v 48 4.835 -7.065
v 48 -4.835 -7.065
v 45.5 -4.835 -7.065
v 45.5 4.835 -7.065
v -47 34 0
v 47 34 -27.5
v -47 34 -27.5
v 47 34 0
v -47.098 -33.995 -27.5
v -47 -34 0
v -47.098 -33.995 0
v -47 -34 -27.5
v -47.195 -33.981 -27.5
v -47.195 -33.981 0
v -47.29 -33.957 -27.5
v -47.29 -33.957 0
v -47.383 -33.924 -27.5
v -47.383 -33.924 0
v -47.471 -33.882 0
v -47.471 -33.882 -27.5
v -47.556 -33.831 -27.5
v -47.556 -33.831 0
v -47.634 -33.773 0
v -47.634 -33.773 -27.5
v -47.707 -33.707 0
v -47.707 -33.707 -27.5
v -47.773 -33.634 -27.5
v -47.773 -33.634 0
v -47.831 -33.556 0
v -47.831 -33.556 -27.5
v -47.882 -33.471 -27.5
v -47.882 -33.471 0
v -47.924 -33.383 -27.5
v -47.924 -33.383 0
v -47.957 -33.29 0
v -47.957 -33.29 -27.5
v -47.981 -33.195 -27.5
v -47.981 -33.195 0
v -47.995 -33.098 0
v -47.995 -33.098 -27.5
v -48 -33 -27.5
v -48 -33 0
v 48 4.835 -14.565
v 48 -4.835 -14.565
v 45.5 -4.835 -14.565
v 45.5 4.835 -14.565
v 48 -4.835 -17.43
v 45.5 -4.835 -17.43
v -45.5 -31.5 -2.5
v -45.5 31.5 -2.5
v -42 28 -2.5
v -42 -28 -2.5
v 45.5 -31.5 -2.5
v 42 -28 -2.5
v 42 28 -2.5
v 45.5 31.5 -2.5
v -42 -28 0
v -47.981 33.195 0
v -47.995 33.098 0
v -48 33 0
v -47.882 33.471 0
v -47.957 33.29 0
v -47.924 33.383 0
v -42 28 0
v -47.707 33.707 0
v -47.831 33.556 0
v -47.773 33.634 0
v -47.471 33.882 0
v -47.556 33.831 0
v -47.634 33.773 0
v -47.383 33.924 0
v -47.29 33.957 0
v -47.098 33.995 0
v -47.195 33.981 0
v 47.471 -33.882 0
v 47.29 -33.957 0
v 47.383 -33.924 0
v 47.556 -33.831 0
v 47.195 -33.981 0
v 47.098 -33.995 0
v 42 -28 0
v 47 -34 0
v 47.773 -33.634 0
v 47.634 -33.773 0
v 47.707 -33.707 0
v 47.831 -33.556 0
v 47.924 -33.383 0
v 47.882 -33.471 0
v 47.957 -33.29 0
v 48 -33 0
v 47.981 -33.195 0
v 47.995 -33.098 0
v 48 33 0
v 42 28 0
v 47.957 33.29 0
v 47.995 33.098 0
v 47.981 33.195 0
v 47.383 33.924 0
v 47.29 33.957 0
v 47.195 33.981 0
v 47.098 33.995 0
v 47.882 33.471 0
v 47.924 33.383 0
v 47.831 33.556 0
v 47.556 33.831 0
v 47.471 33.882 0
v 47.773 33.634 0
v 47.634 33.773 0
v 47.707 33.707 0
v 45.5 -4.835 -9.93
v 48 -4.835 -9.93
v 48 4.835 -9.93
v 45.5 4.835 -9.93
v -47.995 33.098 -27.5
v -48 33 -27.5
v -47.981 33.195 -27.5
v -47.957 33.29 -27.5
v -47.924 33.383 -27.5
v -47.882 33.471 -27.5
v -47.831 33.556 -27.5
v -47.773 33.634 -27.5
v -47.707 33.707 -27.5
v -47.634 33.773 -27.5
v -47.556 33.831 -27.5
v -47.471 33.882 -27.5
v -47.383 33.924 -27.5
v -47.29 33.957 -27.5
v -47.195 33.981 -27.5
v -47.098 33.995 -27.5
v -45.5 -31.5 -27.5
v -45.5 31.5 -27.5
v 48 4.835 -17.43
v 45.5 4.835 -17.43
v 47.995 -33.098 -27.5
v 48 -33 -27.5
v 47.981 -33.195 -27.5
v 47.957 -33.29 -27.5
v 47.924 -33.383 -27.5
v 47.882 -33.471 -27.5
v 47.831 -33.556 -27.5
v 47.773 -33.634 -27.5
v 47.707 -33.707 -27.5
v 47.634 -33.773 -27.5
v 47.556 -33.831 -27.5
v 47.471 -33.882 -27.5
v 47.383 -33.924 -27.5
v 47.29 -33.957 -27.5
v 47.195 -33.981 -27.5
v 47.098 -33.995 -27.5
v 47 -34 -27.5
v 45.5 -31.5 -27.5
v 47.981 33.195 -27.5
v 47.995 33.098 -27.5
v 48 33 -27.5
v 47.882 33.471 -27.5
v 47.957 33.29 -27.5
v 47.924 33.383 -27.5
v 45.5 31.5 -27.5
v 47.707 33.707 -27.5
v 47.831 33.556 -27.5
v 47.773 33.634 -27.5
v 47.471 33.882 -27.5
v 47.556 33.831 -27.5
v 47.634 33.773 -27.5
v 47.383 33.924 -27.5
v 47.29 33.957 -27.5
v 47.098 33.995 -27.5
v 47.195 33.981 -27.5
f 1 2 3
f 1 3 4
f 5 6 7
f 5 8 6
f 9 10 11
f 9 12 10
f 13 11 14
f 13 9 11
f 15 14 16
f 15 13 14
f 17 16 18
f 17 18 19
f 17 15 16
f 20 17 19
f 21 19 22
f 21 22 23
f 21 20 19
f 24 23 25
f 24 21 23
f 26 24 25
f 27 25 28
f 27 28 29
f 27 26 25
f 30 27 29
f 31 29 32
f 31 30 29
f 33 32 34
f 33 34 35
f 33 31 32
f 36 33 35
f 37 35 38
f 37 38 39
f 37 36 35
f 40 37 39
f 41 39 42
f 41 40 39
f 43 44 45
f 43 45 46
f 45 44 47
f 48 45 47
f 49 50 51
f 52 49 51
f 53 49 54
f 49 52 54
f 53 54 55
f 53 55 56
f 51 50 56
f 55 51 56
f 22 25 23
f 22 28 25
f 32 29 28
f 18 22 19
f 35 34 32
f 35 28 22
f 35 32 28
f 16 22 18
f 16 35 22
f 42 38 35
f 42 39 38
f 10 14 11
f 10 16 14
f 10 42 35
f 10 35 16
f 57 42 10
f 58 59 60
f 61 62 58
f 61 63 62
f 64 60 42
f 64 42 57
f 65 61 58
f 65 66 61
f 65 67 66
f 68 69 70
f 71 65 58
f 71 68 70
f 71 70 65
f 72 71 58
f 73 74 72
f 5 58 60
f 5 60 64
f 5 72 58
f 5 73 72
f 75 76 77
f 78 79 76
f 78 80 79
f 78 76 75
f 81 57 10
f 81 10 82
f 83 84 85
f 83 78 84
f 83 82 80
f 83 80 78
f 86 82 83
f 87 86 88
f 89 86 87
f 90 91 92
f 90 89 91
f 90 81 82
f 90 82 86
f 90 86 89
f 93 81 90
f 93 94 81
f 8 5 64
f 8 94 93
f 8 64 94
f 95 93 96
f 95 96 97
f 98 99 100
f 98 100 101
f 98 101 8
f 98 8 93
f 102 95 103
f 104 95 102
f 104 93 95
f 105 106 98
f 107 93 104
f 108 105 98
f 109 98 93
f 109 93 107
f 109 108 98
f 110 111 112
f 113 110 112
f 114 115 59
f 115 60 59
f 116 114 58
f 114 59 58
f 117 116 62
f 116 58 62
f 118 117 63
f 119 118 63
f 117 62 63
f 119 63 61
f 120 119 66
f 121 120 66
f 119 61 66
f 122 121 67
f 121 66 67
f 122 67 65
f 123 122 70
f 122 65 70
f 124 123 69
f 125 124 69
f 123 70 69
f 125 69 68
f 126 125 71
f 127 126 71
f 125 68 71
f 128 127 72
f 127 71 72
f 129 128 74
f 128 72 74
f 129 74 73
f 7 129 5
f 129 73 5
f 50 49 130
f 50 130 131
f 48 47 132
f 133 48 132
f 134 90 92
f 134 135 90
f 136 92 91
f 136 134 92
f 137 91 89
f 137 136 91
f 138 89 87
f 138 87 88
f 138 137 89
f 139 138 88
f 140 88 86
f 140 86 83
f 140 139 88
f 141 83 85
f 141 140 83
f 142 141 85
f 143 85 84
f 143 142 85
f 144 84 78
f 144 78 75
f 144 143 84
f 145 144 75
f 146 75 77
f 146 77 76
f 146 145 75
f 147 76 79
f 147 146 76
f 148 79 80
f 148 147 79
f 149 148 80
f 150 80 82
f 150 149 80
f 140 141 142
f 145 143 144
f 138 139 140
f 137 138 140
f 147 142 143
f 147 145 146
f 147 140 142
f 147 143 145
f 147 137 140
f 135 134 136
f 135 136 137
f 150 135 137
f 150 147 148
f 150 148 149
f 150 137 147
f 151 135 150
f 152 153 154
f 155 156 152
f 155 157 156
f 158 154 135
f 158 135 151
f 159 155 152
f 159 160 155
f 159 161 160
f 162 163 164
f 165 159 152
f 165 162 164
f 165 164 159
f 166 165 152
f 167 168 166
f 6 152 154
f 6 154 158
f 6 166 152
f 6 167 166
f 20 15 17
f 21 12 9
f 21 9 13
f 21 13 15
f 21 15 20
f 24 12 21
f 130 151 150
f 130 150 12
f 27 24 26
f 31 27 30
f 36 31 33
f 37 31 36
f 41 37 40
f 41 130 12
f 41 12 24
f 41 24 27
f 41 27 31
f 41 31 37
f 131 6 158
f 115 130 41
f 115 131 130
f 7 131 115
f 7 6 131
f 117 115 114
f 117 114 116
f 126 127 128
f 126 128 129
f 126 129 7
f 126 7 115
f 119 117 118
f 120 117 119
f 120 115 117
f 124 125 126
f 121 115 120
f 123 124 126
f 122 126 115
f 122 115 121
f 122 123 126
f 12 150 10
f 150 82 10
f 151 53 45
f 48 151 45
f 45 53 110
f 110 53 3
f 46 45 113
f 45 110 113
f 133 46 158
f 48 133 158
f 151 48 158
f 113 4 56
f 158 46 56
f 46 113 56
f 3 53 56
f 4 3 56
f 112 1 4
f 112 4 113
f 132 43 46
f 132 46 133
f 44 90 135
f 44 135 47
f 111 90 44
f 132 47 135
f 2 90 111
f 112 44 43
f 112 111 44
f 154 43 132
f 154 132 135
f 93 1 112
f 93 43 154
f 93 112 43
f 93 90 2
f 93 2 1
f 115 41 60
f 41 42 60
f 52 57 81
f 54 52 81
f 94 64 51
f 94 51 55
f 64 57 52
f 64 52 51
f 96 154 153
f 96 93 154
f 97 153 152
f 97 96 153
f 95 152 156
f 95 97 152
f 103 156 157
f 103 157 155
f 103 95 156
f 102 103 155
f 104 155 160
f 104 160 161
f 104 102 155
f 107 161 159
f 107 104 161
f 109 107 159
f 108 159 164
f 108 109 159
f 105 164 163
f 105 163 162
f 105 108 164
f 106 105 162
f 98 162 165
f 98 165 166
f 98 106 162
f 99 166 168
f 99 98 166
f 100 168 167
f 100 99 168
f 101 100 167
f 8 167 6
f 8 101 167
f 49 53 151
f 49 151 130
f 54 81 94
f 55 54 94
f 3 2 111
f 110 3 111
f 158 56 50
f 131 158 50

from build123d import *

# Parameters (mm, degrees)
SKETCH1_W           = 96
SKETCH1_H           = 68
SKETCH1_W_2         = 84
SKETCH1_H_2         = 56
BOSS_EXTRUDE1_DEPTH = 2.5
SKETCH2_W           = 96
SKETCH2_H           = 68
SKETCH2_W_2         = 91
SKETCH2_H_2         = 63
BOSS_EXTRUDE2_DEPTH = 25
FILLET1_R           = 1
SKETCH3_W           = 2.865098433
SKETCH3_H           = 9.669707212
CUT_EXTRUDE1_DEPTH  = 2.5


with BuildPart() as part:
    # Sketch1 → Boss-Extrude1 (new body)
    with BuildSketch(Plane.XY):
        Rectangle(SKETCH1_W, SKETCH1_H)
        Rectangle(SKETCH1_W_2, SKETCH1_H_2, mode=Mode.SUBTRACT)
    extrude(amount=-BOSS_EXTRUDE1_DEPTH)

    # Sketch2 → Boss-Extrude2 (add)
    with BuildSketch(Plane(origin=(0, 0, -2.5), x_dir=(-1, 0, 0), z_dir=(0, 0, -1))):
        Rectangle(SKETCH2_W, SKETCH2_H)
        Rectangle(SKETCH2_W_2, SKETCH2_H_2, mode=Mode.SUBTRACT)
    extrude(amount=BOSS_EXTRUDE2_DEPTH)

    # Fillet1
    fillet1_edges = [part.edges().sort_by_distance(p)[0] for p in [
        (-48, 34, -13.75),
        (48, 34, -13.75),
        (48, -34, -13.75),
        (-48, -34, -13.75),
    ]]
    fillet(fillet1_edges, radius=FILLET1_R)

    # Sketch3 → Cut-Extrude1 (cut)
    with BuildSketch(Plane(origin=(48, 0, 0), x_dir=(0, 0, -1), z_dir=(1, 0, 0))):
        with Locations((15.997319539, 0)):
            Rectangle(SKETCH3_W, SKETCH3_H)
        with Locations((8.497319539, 0)):
            Rectangle(SKETCH3_W, SKETCH3_H)
    extrude(amount=-CUT_EXTRUDE1_DEPTH, mode=Mode.SUBTRACT)


solid = part.part
